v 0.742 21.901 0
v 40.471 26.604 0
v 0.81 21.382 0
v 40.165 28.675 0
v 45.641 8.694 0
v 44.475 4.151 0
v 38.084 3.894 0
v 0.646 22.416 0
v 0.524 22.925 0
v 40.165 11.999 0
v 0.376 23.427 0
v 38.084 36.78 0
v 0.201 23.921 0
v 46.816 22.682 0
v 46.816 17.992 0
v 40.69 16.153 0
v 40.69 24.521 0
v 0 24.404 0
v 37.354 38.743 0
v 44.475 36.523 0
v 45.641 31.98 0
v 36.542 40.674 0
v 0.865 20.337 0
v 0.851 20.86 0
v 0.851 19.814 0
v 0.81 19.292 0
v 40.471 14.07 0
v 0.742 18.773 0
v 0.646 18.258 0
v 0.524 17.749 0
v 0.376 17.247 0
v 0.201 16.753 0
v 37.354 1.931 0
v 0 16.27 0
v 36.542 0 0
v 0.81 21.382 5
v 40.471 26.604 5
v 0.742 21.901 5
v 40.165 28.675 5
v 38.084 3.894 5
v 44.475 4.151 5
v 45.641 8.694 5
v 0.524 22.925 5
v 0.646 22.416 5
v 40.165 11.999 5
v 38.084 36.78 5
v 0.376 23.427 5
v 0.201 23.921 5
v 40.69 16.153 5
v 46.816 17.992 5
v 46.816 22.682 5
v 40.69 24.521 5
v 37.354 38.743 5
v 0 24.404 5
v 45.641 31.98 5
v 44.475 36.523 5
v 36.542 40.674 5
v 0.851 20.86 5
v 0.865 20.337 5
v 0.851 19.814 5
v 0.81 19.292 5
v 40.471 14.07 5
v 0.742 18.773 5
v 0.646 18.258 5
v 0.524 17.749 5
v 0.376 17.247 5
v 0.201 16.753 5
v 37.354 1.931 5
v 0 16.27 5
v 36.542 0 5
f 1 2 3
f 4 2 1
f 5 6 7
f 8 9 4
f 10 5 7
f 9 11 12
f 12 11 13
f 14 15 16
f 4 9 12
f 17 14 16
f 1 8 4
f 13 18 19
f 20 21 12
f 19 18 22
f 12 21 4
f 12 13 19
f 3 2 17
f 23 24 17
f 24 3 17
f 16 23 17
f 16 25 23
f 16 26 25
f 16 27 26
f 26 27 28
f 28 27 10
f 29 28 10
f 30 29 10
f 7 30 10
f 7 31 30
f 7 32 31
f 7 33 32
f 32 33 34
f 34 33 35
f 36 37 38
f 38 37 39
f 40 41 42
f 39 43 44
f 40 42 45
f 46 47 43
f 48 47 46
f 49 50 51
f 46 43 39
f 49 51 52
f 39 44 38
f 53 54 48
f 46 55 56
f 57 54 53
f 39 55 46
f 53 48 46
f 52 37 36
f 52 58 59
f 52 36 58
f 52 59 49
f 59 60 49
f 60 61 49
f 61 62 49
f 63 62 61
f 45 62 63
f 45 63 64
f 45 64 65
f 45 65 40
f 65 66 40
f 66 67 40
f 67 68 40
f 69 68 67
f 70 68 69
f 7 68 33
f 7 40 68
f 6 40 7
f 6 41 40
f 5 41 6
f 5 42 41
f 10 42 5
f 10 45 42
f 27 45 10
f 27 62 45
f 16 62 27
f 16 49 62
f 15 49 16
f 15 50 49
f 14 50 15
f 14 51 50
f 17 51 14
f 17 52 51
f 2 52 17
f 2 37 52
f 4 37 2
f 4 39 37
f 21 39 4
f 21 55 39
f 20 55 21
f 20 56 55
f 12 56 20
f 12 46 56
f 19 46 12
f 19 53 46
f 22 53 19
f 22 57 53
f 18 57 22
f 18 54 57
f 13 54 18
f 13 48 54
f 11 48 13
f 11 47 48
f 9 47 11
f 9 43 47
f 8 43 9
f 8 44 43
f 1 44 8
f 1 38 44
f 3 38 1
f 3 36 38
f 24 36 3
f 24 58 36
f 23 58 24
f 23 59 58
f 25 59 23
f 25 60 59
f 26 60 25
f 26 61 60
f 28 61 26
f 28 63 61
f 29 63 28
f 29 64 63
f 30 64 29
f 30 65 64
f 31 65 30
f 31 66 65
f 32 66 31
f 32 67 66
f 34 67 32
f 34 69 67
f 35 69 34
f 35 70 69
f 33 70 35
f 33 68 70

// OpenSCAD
$fn = 32;

// ----------------------------------------------------------------------
// Gear sector: 3 teeth on 48 degrees
// ----------------------------------------------------------------------

// --- parameters (mm) ---
sector_angle = 48;        // sector angle, degrees
root_r = 50;              // root circle radius
tooth_h = 6;              // tooth height over the root circle
teeth = 3;                // number of teeth on the sector
hub_r = 10;               // hub bore radius
plate_t = 5;              // sector thickness, Z
arc_step = 3;             // sampling step of the root/hub arcs, degrees

tip_r = root_r + tooth_h;  // tip circle radius

profile = [[36.542, 0], [37.354, 1.931], [38.084, 3.894], [44.475, 4.151], [45.641, 8.694], [40.165, 11.999], [40.471, 14.07], [40.69, 16.153], [46.816, 17.992], [46.816, 22.682], [40.69, 24.521], [40.471, 26.604], [40.165, 28.675], [45.641, 31.98], [44.475, 36.523], [38.084, 36.78], [37.354, 38.743], [36.542, 40.674], [0, 24.404], [0.201, 23.921], [0.376, 23.427], [0.524, 22.925], [0.646, 22.416], [0.742, 21.901], [0.81, 21.382], [0.851, 20.86], [0.865, 20.337], [0.851, 19.814], [0.81, 19.292], [0.742, 18.773], [0.646, 18.258], [0.524, 17.749], [0.376, 17.247], [0.201, 16.753], [0, 16.27]];  // primary outline, 35 points, counter clockwise

// --- the one profile operation ---
linear_extrude(height = plate_t) polygon(points = profile);
